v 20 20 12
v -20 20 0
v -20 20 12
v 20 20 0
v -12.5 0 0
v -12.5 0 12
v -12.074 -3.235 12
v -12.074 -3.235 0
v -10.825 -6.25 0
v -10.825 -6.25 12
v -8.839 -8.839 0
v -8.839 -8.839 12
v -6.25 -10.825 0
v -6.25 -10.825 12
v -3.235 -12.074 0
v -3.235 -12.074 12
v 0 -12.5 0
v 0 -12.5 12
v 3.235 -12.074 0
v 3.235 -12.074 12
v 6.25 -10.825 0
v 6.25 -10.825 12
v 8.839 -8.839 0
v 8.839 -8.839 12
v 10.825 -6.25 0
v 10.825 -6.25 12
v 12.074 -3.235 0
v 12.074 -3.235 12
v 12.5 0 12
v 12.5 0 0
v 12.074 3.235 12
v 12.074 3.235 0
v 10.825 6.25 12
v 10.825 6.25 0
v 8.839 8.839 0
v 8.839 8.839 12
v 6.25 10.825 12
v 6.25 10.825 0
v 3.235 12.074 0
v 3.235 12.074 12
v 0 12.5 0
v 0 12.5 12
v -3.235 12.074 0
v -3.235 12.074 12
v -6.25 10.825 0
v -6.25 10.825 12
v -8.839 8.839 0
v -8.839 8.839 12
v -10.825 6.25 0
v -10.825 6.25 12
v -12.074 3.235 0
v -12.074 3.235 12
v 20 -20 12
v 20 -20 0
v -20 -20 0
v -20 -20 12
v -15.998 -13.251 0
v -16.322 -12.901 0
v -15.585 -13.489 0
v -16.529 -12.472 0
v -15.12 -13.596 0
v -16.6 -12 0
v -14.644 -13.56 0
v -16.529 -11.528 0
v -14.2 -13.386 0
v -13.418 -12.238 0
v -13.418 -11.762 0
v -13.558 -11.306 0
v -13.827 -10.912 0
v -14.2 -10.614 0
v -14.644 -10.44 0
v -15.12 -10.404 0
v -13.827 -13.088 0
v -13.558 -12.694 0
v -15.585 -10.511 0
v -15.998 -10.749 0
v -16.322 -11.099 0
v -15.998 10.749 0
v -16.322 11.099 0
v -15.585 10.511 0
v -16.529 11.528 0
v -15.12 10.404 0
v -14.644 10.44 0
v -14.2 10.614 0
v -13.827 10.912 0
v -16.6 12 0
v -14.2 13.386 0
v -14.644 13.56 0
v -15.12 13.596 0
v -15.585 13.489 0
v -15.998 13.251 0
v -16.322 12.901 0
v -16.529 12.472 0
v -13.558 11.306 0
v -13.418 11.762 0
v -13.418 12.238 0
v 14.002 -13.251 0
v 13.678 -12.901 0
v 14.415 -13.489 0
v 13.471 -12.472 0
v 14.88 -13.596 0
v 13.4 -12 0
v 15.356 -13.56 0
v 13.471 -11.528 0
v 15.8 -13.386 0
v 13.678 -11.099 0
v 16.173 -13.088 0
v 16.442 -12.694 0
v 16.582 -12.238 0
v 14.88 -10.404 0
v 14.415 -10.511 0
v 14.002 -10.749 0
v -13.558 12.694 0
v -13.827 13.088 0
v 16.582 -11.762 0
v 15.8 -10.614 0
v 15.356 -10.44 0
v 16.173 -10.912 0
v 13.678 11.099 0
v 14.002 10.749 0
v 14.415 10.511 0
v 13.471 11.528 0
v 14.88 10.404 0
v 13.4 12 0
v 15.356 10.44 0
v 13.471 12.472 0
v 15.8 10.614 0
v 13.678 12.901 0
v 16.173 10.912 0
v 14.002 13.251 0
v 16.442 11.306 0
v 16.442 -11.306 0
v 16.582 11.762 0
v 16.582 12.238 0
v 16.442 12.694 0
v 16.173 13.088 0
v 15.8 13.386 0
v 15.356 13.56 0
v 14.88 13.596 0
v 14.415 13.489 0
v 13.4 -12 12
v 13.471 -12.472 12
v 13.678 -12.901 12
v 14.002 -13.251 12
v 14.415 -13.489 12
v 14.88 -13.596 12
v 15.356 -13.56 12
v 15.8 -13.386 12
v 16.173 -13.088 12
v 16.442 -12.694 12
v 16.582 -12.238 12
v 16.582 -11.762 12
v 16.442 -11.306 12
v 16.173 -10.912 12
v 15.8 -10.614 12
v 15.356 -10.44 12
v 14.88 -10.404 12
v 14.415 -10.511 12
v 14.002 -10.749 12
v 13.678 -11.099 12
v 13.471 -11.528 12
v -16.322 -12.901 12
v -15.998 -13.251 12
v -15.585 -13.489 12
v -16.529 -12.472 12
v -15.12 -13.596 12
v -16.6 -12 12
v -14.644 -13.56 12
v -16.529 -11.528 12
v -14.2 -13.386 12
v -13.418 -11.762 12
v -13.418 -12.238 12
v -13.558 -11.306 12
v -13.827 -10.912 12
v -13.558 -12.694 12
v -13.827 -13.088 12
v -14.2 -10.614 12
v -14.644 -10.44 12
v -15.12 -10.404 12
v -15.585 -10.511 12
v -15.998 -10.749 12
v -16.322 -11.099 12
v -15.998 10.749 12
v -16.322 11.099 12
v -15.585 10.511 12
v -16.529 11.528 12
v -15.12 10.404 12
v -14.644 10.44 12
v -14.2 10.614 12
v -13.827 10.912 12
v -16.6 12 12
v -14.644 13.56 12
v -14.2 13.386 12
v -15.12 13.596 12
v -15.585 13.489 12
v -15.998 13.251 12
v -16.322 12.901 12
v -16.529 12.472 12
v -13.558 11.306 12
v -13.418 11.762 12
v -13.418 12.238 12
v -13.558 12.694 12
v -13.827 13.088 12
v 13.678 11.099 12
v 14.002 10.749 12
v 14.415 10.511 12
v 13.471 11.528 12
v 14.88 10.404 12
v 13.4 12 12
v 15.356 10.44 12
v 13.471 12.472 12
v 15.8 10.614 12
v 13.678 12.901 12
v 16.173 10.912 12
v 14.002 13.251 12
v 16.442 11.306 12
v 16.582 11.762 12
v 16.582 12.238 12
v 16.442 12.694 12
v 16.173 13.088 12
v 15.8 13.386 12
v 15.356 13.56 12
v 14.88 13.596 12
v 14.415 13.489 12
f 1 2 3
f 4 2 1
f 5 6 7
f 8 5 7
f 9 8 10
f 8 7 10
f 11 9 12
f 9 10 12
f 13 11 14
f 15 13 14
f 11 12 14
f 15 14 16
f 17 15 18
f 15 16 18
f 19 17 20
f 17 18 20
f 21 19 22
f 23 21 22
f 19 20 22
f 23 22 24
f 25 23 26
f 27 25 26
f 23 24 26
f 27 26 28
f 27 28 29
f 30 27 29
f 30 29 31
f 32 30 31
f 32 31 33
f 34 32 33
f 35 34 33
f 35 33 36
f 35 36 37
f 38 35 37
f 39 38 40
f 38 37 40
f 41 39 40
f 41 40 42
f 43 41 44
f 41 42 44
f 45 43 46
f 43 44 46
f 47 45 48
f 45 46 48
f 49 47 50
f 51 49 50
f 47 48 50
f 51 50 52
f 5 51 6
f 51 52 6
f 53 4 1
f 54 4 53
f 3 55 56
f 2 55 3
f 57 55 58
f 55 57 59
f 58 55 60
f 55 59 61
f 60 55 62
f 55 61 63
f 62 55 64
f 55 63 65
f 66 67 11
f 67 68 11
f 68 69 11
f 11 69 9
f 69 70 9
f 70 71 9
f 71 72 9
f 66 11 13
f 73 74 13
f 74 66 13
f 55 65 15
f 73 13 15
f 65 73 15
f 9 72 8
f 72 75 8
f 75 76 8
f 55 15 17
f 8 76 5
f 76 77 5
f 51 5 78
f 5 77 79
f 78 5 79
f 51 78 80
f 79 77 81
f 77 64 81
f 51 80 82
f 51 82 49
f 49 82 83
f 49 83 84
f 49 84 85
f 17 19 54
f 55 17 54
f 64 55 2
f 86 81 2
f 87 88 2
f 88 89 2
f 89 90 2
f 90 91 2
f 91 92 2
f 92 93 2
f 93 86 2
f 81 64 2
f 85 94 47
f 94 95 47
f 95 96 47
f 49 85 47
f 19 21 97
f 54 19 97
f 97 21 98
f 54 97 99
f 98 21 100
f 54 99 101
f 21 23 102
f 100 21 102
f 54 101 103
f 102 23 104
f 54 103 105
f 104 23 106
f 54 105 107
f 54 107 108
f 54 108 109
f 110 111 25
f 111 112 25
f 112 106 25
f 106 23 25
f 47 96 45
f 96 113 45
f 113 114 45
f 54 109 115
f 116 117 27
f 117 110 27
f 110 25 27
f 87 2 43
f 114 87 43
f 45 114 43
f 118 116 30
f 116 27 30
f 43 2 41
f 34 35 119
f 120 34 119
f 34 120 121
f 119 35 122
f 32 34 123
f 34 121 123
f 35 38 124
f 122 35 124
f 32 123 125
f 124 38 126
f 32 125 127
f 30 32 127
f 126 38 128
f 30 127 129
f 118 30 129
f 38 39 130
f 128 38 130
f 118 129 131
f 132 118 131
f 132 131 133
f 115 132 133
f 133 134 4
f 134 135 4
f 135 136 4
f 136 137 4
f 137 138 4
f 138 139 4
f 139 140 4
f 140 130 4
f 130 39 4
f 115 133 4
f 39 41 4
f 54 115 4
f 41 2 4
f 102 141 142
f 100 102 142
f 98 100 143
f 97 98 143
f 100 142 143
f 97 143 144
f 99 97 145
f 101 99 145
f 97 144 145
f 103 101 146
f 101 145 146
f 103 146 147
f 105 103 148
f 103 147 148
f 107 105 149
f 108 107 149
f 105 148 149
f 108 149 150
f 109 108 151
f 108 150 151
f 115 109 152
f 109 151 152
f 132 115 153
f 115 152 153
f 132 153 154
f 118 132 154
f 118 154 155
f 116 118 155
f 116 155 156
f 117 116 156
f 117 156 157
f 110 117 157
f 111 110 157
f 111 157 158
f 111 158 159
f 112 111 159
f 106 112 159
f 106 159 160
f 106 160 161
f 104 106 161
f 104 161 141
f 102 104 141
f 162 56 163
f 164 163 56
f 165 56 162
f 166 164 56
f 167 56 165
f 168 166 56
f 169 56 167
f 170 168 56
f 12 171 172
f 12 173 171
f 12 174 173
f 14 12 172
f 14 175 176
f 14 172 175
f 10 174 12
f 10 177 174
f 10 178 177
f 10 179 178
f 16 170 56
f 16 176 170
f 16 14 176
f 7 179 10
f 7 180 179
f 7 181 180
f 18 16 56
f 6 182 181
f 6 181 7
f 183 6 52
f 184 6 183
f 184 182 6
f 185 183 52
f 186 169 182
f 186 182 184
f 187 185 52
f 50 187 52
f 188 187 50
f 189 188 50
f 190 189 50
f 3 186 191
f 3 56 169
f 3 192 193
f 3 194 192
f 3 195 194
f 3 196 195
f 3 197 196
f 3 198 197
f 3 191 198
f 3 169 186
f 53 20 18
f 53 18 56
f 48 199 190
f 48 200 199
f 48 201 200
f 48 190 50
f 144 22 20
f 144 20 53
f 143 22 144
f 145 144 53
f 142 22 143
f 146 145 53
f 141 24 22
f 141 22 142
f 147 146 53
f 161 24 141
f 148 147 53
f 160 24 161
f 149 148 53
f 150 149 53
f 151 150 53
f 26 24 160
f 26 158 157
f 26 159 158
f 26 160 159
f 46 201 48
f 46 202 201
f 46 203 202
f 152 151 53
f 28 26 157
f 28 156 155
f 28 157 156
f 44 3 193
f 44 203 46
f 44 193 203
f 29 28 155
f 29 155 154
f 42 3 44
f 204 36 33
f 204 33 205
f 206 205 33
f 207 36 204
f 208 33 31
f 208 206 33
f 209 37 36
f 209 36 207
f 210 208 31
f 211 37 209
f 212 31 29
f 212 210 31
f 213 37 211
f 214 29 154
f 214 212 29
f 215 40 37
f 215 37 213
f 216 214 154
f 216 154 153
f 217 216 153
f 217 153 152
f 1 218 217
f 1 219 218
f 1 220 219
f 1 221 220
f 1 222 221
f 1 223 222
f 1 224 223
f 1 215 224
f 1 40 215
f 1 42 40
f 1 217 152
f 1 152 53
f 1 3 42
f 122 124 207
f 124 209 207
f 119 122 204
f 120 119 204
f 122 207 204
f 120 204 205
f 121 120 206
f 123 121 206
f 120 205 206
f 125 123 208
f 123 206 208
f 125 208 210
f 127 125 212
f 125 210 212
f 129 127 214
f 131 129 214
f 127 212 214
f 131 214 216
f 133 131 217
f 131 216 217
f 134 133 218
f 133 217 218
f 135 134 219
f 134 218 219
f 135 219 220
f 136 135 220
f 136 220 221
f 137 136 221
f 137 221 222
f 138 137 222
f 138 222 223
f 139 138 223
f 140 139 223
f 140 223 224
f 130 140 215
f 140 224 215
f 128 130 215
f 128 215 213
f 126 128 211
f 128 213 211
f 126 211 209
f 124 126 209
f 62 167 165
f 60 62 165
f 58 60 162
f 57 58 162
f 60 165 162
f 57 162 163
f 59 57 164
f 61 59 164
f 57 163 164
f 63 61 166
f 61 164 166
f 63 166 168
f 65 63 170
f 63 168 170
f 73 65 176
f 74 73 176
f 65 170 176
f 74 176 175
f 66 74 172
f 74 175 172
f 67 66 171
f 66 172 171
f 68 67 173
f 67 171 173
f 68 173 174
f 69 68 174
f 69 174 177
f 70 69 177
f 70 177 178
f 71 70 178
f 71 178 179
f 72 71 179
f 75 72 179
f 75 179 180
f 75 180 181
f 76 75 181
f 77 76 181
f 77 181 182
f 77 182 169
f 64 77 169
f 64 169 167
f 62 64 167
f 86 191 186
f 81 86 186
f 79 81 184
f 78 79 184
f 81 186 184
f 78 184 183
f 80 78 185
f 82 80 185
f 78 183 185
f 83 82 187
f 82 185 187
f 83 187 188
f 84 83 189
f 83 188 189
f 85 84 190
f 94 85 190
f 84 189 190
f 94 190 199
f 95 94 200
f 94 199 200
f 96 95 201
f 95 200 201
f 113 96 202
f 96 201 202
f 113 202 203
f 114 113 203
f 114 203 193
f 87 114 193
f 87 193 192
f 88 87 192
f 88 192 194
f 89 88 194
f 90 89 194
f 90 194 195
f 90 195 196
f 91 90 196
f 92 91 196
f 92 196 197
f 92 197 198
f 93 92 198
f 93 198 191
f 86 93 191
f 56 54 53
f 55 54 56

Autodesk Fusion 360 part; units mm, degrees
sketch "Sketch1" plane through (0, 0, 0) normal (0, 0, 1) x (1, 0, 0)
  line L0 (-20, 20) -> (20, 20)
  line L1 (20, 20) -> (20, -20)
  line L2 (20, -20) -> (-20, -20)
  line L3 (-20, -20) -> (-20, 20)
  line L4 (0, 0) -> (15, 0)
  line L5 (0, 0) -> (0, -12)
  line L6 (0, -12) -> (15, -12)
  line L7 (15, -12) -> (-15, -12)
  line L8 (-15, -12) -> (-15, 12)
  line L9 (-15, 12) -> (15, 12)
  line L10 (15, 12) -> (15, -12)
  circle A0 centre (-15, 12) radius 1.5
  circle A1 centre (15, 12) radius 1.5
  circle A2 centre (15, -12) radius 1.5
  circle A3 centre (-15, -12) radius 1.5
  dimension "d1" = 12
  dimension "d2" = 30
  dimension "d3" = 24
  dimension "d4" = 3
  dimension "d5" = 3
  dimension "d6" = 3
  dimension "d7" = 3
extrude "Extrude1" add sketch "Sketch1" along normal blind 12 contours L0 L1 L2 L3 | L4 L5 L7 L8 L9 L10 A0 A1 A3 | L4 L5 L6 L7 L10 A2
sketch "Sketch2" plane through (0, 0, 12) normal (0, 0, 1) x (-1, 0, 0)
  circle A0 centre (-15, -12) radius 1.5
  circle A1 centre (15, 12) radius 1.5
  circle A2 centre (15, -12) radius 1.5
  circle A3 centre (-15, 12) radius 1.5
  line L0 (20, 20) -> (-20, 20)
  line L1 (-20, 20) -> (-20, -20)
  line L2 (-20, -20) -> (20, -20)
  line L3 (20, -20) -> (20, 20)
  circle A4 centre (0, 0) radius 12.5
  dimension "d10" = 25
extrude "Extrude2" cut sketch "Sketch2" against normal blind 12 contours A4
sketch "Sketch3" plane through (0, 0, 12) normal (0, 0, 1) x (-1, 0, 0)
  circle A0 centre (0, 0) radius 12.5
  circle A1 centre (-15, -12) radius 1.5
  circle A2 centre (15, 12) radius 1.5
  circle A3 centre (15, -12) radius 1.5
  circle A4 centre (-15, 12) radius 1.5
  line L0 (20, 20) -> (-20, 20)
  line L1 (-20, 20) -> (-20, -20)
  line L2 (-20, -20) -> (20, -20)
  line L3 (20, -20) -> (20, 20)
  circle A5 centre (15, -12) radius 1.6
  circle A6 centre (-15, -12) radius 1.6
  circle A7 centre (-15, 12) radius 1.6
  circle A8 centre (15, 12) radius 1.6
  dimension "d13" = 3.2
  dimension "d14" = 3.2
  dimension "d15" = 3.2
  dimension "d16" = 3.2
extrude "Extrude3" cut sketch "Sketch3" against normal blind 12 contours A5 | A6 | A7 | A8
sketch "Sketch4" plane through (0, 0, 12) normal (0, 0, 1) x (-1, 0, 0)
  circle A0 centre (15, 12) radius 1.6
  circle A1 centre (-15, 12) radius 1.6
  circle A2 centre (15, -12) radius 1.6
  circle A3 centre (-15, -12) radius 1.6
  circle A4 centre (0, 0) radius 12.5
  line L0 (20, 20) -> (-20, 20)
  line L1 (-20, 20) -> (-20, -20)
  line L2 (-20, -20) -> (20, -20)
  line L3 (20, -20) -> (20, 20)
